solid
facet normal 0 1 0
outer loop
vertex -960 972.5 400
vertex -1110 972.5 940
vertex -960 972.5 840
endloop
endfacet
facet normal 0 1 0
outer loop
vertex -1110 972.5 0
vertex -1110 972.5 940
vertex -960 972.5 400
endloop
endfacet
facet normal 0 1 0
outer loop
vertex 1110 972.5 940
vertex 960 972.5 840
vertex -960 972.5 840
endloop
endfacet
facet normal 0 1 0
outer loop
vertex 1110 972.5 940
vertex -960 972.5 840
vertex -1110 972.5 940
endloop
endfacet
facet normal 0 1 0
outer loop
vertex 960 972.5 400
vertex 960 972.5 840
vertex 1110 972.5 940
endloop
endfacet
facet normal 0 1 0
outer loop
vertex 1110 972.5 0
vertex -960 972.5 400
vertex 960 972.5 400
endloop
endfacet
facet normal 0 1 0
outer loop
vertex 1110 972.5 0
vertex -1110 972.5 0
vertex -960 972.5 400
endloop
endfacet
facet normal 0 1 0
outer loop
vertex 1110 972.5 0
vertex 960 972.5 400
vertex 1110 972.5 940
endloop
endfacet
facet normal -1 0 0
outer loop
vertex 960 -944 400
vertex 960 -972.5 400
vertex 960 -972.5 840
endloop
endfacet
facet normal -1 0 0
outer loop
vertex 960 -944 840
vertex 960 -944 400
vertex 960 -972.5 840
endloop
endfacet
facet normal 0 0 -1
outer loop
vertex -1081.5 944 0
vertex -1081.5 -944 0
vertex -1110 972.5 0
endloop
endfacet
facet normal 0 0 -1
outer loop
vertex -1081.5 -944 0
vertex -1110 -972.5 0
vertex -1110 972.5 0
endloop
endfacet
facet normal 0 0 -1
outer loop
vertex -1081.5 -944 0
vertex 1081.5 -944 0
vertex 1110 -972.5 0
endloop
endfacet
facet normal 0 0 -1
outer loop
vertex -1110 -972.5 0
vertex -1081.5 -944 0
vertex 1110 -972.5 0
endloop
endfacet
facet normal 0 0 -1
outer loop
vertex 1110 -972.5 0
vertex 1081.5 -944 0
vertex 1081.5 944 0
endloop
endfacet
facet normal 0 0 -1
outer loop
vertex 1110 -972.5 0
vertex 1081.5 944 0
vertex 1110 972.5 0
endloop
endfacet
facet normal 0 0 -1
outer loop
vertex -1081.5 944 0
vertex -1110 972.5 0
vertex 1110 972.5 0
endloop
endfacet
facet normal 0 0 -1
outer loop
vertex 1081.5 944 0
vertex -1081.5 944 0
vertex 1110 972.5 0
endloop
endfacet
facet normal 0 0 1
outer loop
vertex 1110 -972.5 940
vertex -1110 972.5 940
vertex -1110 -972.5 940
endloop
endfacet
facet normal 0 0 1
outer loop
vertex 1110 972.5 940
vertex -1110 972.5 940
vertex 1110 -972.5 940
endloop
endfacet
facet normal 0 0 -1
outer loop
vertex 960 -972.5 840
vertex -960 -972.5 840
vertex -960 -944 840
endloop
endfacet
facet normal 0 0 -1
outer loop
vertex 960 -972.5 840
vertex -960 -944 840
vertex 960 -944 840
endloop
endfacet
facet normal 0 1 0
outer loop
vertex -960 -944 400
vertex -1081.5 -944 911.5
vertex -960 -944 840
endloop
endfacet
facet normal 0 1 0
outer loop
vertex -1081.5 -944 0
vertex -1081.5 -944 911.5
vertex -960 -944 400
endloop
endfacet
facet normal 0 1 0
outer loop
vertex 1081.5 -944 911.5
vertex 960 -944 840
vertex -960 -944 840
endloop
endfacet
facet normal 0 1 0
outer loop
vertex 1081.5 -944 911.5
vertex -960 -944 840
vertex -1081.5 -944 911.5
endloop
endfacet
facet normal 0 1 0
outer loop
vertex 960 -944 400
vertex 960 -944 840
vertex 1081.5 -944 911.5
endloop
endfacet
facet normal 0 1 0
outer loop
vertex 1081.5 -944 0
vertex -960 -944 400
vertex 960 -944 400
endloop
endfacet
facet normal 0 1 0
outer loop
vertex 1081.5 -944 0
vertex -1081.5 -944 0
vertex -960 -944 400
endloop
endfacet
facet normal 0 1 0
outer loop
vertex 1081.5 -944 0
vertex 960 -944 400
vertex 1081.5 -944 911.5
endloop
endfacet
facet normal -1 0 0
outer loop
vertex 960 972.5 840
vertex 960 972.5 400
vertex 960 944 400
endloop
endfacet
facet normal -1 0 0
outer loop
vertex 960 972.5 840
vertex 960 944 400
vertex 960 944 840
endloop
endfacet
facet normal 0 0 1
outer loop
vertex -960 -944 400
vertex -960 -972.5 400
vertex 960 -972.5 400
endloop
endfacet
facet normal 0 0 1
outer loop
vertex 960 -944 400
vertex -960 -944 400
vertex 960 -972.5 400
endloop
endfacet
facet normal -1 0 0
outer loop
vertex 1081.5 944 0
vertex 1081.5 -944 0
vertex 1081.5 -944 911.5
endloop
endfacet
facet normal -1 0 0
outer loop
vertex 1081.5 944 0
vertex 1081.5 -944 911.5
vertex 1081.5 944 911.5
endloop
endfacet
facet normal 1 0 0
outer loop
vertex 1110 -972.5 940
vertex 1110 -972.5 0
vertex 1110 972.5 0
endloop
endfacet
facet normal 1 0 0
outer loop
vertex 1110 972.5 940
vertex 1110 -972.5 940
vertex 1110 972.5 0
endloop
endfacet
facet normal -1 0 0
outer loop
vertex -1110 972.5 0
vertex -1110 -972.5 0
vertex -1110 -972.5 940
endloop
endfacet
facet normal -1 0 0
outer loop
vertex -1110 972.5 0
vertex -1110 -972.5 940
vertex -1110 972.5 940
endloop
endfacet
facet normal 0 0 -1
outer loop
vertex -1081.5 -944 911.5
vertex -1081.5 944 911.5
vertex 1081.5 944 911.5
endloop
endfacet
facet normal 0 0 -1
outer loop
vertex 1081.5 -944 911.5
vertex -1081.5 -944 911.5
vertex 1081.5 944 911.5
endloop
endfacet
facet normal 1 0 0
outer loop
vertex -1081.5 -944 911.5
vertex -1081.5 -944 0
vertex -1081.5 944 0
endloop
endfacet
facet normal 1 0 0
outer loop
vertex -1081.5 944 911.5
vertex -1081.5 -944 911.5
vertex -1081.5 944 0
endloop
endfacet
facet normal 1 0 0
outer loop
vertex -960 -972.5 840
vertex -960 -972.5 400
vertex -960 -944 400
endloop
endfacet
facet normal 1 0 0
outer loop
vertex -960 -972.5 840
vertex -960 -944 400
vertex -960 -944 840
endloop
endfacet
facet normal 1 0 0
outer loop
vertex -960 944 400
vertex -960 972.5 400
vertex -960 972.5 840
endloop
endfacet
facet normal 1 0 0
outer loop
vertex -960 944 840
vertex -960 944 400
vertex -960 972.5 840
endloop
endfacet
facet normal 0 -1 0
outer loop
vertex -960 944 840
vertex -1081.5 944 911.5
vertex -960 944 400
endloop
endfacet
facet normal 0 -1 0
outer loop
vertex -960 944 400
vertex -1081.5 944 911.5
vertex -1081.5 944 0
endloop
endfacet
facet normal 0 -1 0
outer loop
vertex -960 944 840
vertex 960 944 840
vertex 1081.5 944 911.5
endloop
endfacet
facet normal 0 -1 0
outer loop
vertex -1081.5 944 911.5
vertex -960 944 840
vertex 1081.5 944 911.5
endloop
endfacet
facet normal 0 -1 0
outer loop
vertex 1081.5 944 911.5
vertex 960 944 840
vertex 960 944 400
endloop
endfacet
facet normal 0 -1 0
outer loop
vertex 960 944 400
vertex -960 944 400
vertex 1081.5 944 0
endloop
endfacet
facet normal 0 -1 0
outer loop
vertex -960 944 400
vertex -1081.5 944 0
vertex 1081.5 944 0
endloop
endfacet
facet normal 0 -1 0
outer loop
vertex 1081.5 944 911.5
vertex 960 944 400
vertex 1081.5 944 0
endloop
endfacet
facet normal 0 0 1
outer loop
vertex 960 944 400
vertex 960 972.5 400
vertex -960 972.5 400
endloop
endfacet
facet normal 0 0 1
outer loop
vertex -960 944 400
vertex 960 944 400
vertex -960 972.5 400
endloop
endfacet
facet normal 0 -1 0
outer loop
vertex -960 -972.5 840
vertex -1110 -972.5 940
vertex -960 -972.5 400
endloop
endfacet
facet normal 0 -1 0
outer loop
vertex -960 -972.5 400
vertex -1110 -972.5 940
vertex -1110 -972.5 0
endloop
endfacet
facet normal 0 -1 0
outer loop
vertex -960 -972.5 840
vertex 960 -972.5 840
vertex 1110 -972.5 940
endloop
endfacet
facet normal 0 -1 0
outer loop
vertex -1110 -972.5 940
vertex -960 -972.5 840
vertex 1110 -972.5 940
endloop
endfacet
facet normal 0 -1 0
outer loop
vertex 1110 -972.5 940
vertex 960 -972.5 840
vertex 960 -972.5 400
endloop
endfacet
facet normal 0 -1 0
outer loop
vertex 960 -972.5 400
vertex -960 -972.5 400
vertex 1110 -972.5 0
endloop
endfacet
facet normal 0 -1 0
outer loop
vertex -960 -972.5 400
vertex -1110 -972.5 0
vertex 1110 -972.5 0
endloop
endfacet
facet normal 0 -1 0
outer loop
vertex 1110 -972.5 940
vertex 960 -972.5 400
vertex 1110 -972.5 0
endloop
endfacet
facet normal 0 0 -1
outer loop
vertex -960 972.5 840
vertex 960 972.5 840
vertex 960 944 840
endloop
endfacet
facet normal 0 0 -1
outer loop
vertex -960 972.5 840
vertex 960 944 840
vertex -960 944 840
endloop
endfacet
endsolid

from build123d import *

# Parameters (mm, degrees)
F0_W     = 2220
F0_H     = 1945
F1_DEPTH = 940
F2_T     = -28.5
F3_W     = 1920
F3_H     = 440
F4_DEPTH = 28.5
F5_W     = 1920
F5_H     = 440
F6_DEPTH = 28.5


with BuildPart() as f1:
    # F0 (on Top) → F1 (new body)
    with BuildSketch(Plane.XY):
        Rectangle(F0_W, F0_H)
    extrude(amount=F1_DEPTH)

    # F2
    f2_openings = [f1.faces().sort_by_distance(p)[0] for p in [
        (0, 0, 0),
    ]]
    offset(amount=F2_T, openings=f2_openings)

    # F3 (on face) → F4 (cut, through all)
    with BuildSketch(Plane.XZ.offset(972.5)):
        with Locations((0, 620)):
            Rectangle(F3_W, F3_H)
    extrude(amount=-F4_DEPTH, mode=Mode.SUBTRACT)

    # F5 (on face) → F6 (cut, through all)
    with BuildSketch(Plane(origin=(0, 972.5, 0), x_dir=(-1, 0, 0), z_dir=(0, 1, 0))):
        with Locations((0, 620)):
            Rectangle(F5_W, F5_H)
    extrude(amount=-F6_DEPTH, mode=Mode.SUBTRACT)


solid = f1.part
